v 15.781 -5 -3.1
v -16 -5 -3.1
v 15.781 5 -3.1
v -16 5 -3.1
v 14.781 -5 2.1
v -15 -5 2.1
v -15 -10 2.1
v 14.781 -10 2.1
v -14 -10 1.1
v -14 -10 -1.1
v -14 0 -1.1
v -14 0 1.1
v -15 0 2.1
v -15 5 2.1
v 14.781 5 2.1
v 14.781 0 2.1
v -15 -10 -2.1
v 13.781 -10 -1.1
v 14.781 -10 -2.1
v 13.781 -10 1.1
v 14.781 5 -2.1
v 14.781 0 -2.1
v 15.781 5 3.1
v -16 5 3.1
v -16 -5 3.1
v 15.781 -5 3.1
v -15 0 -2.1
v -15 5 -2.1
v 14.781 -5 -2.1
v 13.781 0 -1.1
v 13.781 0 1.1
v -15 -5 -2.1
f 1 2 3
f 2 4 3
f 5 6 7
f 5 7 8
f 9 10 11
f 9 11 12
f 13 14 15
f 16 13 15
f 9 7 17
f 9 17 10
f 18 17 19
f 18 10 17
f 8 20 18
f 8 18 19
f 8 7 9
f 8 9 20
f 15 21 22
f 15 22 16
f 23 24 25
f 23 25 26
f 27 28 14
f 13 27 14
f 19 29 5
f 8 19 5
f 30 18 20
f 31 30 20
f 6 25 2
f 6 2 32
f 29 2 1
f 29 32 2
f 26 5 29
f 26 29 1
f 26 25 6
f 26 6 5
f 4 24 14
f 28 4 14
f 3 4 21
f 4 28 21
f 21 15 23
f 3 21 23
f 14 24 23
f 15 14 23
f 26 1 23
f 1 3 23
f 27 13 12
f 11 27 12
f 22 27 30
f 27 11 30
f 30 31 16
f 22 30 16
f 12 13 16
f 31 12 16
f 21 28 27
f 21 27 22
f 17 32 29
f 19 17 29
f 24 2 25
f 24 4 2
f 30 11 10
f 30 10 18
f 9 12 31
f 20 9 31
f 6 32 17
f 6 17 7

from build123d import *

# Parameters (mm, degrees)
F0_W          = 31.7814054862
F0_H          = 6.2
F0_W_2        = 29.7814054862
F0_H_2        = 4.2
F1_DEPTH      = 5
F1_DEPTH_BACK = 5
F0_W_3        = 27.7814054862
F0_H_3        = 2.2
F2_DEPTH      = 10


with BuildPart() as f1:
    # F0 (on Front) → F1 (new body, two sides)
    with BuildSketch(Plane.XZ) as f1_sk:
        with Locations((-0.1092972569, 0)):
            Rectangle(F0_W, F0_H)
        with Locations((-0.1092972569, 0)):
            Rectangle(F0_W_2, F0_H_2, mode=Mode.SUBTRACT)
    extrude(amount=-F1_DEPTH)
    extrude(f1_sk.sketch, amount=F1_DEPTH_BACK)

    # F0 (on Front) → F2 (join)
    with BuildSketch(Plane.XZ):
        with Locations((-0.1092972569, 0)):
            Rectangle(F0_W_2, F0_H_2)
        with Locations((-0.1092972569, 0)):
            Rectangle(F0_W_3, F0_H_3, mode=Mode.SUBTRACT)
    extrude(amount=F2_DEPTH)


solid = f1.part
